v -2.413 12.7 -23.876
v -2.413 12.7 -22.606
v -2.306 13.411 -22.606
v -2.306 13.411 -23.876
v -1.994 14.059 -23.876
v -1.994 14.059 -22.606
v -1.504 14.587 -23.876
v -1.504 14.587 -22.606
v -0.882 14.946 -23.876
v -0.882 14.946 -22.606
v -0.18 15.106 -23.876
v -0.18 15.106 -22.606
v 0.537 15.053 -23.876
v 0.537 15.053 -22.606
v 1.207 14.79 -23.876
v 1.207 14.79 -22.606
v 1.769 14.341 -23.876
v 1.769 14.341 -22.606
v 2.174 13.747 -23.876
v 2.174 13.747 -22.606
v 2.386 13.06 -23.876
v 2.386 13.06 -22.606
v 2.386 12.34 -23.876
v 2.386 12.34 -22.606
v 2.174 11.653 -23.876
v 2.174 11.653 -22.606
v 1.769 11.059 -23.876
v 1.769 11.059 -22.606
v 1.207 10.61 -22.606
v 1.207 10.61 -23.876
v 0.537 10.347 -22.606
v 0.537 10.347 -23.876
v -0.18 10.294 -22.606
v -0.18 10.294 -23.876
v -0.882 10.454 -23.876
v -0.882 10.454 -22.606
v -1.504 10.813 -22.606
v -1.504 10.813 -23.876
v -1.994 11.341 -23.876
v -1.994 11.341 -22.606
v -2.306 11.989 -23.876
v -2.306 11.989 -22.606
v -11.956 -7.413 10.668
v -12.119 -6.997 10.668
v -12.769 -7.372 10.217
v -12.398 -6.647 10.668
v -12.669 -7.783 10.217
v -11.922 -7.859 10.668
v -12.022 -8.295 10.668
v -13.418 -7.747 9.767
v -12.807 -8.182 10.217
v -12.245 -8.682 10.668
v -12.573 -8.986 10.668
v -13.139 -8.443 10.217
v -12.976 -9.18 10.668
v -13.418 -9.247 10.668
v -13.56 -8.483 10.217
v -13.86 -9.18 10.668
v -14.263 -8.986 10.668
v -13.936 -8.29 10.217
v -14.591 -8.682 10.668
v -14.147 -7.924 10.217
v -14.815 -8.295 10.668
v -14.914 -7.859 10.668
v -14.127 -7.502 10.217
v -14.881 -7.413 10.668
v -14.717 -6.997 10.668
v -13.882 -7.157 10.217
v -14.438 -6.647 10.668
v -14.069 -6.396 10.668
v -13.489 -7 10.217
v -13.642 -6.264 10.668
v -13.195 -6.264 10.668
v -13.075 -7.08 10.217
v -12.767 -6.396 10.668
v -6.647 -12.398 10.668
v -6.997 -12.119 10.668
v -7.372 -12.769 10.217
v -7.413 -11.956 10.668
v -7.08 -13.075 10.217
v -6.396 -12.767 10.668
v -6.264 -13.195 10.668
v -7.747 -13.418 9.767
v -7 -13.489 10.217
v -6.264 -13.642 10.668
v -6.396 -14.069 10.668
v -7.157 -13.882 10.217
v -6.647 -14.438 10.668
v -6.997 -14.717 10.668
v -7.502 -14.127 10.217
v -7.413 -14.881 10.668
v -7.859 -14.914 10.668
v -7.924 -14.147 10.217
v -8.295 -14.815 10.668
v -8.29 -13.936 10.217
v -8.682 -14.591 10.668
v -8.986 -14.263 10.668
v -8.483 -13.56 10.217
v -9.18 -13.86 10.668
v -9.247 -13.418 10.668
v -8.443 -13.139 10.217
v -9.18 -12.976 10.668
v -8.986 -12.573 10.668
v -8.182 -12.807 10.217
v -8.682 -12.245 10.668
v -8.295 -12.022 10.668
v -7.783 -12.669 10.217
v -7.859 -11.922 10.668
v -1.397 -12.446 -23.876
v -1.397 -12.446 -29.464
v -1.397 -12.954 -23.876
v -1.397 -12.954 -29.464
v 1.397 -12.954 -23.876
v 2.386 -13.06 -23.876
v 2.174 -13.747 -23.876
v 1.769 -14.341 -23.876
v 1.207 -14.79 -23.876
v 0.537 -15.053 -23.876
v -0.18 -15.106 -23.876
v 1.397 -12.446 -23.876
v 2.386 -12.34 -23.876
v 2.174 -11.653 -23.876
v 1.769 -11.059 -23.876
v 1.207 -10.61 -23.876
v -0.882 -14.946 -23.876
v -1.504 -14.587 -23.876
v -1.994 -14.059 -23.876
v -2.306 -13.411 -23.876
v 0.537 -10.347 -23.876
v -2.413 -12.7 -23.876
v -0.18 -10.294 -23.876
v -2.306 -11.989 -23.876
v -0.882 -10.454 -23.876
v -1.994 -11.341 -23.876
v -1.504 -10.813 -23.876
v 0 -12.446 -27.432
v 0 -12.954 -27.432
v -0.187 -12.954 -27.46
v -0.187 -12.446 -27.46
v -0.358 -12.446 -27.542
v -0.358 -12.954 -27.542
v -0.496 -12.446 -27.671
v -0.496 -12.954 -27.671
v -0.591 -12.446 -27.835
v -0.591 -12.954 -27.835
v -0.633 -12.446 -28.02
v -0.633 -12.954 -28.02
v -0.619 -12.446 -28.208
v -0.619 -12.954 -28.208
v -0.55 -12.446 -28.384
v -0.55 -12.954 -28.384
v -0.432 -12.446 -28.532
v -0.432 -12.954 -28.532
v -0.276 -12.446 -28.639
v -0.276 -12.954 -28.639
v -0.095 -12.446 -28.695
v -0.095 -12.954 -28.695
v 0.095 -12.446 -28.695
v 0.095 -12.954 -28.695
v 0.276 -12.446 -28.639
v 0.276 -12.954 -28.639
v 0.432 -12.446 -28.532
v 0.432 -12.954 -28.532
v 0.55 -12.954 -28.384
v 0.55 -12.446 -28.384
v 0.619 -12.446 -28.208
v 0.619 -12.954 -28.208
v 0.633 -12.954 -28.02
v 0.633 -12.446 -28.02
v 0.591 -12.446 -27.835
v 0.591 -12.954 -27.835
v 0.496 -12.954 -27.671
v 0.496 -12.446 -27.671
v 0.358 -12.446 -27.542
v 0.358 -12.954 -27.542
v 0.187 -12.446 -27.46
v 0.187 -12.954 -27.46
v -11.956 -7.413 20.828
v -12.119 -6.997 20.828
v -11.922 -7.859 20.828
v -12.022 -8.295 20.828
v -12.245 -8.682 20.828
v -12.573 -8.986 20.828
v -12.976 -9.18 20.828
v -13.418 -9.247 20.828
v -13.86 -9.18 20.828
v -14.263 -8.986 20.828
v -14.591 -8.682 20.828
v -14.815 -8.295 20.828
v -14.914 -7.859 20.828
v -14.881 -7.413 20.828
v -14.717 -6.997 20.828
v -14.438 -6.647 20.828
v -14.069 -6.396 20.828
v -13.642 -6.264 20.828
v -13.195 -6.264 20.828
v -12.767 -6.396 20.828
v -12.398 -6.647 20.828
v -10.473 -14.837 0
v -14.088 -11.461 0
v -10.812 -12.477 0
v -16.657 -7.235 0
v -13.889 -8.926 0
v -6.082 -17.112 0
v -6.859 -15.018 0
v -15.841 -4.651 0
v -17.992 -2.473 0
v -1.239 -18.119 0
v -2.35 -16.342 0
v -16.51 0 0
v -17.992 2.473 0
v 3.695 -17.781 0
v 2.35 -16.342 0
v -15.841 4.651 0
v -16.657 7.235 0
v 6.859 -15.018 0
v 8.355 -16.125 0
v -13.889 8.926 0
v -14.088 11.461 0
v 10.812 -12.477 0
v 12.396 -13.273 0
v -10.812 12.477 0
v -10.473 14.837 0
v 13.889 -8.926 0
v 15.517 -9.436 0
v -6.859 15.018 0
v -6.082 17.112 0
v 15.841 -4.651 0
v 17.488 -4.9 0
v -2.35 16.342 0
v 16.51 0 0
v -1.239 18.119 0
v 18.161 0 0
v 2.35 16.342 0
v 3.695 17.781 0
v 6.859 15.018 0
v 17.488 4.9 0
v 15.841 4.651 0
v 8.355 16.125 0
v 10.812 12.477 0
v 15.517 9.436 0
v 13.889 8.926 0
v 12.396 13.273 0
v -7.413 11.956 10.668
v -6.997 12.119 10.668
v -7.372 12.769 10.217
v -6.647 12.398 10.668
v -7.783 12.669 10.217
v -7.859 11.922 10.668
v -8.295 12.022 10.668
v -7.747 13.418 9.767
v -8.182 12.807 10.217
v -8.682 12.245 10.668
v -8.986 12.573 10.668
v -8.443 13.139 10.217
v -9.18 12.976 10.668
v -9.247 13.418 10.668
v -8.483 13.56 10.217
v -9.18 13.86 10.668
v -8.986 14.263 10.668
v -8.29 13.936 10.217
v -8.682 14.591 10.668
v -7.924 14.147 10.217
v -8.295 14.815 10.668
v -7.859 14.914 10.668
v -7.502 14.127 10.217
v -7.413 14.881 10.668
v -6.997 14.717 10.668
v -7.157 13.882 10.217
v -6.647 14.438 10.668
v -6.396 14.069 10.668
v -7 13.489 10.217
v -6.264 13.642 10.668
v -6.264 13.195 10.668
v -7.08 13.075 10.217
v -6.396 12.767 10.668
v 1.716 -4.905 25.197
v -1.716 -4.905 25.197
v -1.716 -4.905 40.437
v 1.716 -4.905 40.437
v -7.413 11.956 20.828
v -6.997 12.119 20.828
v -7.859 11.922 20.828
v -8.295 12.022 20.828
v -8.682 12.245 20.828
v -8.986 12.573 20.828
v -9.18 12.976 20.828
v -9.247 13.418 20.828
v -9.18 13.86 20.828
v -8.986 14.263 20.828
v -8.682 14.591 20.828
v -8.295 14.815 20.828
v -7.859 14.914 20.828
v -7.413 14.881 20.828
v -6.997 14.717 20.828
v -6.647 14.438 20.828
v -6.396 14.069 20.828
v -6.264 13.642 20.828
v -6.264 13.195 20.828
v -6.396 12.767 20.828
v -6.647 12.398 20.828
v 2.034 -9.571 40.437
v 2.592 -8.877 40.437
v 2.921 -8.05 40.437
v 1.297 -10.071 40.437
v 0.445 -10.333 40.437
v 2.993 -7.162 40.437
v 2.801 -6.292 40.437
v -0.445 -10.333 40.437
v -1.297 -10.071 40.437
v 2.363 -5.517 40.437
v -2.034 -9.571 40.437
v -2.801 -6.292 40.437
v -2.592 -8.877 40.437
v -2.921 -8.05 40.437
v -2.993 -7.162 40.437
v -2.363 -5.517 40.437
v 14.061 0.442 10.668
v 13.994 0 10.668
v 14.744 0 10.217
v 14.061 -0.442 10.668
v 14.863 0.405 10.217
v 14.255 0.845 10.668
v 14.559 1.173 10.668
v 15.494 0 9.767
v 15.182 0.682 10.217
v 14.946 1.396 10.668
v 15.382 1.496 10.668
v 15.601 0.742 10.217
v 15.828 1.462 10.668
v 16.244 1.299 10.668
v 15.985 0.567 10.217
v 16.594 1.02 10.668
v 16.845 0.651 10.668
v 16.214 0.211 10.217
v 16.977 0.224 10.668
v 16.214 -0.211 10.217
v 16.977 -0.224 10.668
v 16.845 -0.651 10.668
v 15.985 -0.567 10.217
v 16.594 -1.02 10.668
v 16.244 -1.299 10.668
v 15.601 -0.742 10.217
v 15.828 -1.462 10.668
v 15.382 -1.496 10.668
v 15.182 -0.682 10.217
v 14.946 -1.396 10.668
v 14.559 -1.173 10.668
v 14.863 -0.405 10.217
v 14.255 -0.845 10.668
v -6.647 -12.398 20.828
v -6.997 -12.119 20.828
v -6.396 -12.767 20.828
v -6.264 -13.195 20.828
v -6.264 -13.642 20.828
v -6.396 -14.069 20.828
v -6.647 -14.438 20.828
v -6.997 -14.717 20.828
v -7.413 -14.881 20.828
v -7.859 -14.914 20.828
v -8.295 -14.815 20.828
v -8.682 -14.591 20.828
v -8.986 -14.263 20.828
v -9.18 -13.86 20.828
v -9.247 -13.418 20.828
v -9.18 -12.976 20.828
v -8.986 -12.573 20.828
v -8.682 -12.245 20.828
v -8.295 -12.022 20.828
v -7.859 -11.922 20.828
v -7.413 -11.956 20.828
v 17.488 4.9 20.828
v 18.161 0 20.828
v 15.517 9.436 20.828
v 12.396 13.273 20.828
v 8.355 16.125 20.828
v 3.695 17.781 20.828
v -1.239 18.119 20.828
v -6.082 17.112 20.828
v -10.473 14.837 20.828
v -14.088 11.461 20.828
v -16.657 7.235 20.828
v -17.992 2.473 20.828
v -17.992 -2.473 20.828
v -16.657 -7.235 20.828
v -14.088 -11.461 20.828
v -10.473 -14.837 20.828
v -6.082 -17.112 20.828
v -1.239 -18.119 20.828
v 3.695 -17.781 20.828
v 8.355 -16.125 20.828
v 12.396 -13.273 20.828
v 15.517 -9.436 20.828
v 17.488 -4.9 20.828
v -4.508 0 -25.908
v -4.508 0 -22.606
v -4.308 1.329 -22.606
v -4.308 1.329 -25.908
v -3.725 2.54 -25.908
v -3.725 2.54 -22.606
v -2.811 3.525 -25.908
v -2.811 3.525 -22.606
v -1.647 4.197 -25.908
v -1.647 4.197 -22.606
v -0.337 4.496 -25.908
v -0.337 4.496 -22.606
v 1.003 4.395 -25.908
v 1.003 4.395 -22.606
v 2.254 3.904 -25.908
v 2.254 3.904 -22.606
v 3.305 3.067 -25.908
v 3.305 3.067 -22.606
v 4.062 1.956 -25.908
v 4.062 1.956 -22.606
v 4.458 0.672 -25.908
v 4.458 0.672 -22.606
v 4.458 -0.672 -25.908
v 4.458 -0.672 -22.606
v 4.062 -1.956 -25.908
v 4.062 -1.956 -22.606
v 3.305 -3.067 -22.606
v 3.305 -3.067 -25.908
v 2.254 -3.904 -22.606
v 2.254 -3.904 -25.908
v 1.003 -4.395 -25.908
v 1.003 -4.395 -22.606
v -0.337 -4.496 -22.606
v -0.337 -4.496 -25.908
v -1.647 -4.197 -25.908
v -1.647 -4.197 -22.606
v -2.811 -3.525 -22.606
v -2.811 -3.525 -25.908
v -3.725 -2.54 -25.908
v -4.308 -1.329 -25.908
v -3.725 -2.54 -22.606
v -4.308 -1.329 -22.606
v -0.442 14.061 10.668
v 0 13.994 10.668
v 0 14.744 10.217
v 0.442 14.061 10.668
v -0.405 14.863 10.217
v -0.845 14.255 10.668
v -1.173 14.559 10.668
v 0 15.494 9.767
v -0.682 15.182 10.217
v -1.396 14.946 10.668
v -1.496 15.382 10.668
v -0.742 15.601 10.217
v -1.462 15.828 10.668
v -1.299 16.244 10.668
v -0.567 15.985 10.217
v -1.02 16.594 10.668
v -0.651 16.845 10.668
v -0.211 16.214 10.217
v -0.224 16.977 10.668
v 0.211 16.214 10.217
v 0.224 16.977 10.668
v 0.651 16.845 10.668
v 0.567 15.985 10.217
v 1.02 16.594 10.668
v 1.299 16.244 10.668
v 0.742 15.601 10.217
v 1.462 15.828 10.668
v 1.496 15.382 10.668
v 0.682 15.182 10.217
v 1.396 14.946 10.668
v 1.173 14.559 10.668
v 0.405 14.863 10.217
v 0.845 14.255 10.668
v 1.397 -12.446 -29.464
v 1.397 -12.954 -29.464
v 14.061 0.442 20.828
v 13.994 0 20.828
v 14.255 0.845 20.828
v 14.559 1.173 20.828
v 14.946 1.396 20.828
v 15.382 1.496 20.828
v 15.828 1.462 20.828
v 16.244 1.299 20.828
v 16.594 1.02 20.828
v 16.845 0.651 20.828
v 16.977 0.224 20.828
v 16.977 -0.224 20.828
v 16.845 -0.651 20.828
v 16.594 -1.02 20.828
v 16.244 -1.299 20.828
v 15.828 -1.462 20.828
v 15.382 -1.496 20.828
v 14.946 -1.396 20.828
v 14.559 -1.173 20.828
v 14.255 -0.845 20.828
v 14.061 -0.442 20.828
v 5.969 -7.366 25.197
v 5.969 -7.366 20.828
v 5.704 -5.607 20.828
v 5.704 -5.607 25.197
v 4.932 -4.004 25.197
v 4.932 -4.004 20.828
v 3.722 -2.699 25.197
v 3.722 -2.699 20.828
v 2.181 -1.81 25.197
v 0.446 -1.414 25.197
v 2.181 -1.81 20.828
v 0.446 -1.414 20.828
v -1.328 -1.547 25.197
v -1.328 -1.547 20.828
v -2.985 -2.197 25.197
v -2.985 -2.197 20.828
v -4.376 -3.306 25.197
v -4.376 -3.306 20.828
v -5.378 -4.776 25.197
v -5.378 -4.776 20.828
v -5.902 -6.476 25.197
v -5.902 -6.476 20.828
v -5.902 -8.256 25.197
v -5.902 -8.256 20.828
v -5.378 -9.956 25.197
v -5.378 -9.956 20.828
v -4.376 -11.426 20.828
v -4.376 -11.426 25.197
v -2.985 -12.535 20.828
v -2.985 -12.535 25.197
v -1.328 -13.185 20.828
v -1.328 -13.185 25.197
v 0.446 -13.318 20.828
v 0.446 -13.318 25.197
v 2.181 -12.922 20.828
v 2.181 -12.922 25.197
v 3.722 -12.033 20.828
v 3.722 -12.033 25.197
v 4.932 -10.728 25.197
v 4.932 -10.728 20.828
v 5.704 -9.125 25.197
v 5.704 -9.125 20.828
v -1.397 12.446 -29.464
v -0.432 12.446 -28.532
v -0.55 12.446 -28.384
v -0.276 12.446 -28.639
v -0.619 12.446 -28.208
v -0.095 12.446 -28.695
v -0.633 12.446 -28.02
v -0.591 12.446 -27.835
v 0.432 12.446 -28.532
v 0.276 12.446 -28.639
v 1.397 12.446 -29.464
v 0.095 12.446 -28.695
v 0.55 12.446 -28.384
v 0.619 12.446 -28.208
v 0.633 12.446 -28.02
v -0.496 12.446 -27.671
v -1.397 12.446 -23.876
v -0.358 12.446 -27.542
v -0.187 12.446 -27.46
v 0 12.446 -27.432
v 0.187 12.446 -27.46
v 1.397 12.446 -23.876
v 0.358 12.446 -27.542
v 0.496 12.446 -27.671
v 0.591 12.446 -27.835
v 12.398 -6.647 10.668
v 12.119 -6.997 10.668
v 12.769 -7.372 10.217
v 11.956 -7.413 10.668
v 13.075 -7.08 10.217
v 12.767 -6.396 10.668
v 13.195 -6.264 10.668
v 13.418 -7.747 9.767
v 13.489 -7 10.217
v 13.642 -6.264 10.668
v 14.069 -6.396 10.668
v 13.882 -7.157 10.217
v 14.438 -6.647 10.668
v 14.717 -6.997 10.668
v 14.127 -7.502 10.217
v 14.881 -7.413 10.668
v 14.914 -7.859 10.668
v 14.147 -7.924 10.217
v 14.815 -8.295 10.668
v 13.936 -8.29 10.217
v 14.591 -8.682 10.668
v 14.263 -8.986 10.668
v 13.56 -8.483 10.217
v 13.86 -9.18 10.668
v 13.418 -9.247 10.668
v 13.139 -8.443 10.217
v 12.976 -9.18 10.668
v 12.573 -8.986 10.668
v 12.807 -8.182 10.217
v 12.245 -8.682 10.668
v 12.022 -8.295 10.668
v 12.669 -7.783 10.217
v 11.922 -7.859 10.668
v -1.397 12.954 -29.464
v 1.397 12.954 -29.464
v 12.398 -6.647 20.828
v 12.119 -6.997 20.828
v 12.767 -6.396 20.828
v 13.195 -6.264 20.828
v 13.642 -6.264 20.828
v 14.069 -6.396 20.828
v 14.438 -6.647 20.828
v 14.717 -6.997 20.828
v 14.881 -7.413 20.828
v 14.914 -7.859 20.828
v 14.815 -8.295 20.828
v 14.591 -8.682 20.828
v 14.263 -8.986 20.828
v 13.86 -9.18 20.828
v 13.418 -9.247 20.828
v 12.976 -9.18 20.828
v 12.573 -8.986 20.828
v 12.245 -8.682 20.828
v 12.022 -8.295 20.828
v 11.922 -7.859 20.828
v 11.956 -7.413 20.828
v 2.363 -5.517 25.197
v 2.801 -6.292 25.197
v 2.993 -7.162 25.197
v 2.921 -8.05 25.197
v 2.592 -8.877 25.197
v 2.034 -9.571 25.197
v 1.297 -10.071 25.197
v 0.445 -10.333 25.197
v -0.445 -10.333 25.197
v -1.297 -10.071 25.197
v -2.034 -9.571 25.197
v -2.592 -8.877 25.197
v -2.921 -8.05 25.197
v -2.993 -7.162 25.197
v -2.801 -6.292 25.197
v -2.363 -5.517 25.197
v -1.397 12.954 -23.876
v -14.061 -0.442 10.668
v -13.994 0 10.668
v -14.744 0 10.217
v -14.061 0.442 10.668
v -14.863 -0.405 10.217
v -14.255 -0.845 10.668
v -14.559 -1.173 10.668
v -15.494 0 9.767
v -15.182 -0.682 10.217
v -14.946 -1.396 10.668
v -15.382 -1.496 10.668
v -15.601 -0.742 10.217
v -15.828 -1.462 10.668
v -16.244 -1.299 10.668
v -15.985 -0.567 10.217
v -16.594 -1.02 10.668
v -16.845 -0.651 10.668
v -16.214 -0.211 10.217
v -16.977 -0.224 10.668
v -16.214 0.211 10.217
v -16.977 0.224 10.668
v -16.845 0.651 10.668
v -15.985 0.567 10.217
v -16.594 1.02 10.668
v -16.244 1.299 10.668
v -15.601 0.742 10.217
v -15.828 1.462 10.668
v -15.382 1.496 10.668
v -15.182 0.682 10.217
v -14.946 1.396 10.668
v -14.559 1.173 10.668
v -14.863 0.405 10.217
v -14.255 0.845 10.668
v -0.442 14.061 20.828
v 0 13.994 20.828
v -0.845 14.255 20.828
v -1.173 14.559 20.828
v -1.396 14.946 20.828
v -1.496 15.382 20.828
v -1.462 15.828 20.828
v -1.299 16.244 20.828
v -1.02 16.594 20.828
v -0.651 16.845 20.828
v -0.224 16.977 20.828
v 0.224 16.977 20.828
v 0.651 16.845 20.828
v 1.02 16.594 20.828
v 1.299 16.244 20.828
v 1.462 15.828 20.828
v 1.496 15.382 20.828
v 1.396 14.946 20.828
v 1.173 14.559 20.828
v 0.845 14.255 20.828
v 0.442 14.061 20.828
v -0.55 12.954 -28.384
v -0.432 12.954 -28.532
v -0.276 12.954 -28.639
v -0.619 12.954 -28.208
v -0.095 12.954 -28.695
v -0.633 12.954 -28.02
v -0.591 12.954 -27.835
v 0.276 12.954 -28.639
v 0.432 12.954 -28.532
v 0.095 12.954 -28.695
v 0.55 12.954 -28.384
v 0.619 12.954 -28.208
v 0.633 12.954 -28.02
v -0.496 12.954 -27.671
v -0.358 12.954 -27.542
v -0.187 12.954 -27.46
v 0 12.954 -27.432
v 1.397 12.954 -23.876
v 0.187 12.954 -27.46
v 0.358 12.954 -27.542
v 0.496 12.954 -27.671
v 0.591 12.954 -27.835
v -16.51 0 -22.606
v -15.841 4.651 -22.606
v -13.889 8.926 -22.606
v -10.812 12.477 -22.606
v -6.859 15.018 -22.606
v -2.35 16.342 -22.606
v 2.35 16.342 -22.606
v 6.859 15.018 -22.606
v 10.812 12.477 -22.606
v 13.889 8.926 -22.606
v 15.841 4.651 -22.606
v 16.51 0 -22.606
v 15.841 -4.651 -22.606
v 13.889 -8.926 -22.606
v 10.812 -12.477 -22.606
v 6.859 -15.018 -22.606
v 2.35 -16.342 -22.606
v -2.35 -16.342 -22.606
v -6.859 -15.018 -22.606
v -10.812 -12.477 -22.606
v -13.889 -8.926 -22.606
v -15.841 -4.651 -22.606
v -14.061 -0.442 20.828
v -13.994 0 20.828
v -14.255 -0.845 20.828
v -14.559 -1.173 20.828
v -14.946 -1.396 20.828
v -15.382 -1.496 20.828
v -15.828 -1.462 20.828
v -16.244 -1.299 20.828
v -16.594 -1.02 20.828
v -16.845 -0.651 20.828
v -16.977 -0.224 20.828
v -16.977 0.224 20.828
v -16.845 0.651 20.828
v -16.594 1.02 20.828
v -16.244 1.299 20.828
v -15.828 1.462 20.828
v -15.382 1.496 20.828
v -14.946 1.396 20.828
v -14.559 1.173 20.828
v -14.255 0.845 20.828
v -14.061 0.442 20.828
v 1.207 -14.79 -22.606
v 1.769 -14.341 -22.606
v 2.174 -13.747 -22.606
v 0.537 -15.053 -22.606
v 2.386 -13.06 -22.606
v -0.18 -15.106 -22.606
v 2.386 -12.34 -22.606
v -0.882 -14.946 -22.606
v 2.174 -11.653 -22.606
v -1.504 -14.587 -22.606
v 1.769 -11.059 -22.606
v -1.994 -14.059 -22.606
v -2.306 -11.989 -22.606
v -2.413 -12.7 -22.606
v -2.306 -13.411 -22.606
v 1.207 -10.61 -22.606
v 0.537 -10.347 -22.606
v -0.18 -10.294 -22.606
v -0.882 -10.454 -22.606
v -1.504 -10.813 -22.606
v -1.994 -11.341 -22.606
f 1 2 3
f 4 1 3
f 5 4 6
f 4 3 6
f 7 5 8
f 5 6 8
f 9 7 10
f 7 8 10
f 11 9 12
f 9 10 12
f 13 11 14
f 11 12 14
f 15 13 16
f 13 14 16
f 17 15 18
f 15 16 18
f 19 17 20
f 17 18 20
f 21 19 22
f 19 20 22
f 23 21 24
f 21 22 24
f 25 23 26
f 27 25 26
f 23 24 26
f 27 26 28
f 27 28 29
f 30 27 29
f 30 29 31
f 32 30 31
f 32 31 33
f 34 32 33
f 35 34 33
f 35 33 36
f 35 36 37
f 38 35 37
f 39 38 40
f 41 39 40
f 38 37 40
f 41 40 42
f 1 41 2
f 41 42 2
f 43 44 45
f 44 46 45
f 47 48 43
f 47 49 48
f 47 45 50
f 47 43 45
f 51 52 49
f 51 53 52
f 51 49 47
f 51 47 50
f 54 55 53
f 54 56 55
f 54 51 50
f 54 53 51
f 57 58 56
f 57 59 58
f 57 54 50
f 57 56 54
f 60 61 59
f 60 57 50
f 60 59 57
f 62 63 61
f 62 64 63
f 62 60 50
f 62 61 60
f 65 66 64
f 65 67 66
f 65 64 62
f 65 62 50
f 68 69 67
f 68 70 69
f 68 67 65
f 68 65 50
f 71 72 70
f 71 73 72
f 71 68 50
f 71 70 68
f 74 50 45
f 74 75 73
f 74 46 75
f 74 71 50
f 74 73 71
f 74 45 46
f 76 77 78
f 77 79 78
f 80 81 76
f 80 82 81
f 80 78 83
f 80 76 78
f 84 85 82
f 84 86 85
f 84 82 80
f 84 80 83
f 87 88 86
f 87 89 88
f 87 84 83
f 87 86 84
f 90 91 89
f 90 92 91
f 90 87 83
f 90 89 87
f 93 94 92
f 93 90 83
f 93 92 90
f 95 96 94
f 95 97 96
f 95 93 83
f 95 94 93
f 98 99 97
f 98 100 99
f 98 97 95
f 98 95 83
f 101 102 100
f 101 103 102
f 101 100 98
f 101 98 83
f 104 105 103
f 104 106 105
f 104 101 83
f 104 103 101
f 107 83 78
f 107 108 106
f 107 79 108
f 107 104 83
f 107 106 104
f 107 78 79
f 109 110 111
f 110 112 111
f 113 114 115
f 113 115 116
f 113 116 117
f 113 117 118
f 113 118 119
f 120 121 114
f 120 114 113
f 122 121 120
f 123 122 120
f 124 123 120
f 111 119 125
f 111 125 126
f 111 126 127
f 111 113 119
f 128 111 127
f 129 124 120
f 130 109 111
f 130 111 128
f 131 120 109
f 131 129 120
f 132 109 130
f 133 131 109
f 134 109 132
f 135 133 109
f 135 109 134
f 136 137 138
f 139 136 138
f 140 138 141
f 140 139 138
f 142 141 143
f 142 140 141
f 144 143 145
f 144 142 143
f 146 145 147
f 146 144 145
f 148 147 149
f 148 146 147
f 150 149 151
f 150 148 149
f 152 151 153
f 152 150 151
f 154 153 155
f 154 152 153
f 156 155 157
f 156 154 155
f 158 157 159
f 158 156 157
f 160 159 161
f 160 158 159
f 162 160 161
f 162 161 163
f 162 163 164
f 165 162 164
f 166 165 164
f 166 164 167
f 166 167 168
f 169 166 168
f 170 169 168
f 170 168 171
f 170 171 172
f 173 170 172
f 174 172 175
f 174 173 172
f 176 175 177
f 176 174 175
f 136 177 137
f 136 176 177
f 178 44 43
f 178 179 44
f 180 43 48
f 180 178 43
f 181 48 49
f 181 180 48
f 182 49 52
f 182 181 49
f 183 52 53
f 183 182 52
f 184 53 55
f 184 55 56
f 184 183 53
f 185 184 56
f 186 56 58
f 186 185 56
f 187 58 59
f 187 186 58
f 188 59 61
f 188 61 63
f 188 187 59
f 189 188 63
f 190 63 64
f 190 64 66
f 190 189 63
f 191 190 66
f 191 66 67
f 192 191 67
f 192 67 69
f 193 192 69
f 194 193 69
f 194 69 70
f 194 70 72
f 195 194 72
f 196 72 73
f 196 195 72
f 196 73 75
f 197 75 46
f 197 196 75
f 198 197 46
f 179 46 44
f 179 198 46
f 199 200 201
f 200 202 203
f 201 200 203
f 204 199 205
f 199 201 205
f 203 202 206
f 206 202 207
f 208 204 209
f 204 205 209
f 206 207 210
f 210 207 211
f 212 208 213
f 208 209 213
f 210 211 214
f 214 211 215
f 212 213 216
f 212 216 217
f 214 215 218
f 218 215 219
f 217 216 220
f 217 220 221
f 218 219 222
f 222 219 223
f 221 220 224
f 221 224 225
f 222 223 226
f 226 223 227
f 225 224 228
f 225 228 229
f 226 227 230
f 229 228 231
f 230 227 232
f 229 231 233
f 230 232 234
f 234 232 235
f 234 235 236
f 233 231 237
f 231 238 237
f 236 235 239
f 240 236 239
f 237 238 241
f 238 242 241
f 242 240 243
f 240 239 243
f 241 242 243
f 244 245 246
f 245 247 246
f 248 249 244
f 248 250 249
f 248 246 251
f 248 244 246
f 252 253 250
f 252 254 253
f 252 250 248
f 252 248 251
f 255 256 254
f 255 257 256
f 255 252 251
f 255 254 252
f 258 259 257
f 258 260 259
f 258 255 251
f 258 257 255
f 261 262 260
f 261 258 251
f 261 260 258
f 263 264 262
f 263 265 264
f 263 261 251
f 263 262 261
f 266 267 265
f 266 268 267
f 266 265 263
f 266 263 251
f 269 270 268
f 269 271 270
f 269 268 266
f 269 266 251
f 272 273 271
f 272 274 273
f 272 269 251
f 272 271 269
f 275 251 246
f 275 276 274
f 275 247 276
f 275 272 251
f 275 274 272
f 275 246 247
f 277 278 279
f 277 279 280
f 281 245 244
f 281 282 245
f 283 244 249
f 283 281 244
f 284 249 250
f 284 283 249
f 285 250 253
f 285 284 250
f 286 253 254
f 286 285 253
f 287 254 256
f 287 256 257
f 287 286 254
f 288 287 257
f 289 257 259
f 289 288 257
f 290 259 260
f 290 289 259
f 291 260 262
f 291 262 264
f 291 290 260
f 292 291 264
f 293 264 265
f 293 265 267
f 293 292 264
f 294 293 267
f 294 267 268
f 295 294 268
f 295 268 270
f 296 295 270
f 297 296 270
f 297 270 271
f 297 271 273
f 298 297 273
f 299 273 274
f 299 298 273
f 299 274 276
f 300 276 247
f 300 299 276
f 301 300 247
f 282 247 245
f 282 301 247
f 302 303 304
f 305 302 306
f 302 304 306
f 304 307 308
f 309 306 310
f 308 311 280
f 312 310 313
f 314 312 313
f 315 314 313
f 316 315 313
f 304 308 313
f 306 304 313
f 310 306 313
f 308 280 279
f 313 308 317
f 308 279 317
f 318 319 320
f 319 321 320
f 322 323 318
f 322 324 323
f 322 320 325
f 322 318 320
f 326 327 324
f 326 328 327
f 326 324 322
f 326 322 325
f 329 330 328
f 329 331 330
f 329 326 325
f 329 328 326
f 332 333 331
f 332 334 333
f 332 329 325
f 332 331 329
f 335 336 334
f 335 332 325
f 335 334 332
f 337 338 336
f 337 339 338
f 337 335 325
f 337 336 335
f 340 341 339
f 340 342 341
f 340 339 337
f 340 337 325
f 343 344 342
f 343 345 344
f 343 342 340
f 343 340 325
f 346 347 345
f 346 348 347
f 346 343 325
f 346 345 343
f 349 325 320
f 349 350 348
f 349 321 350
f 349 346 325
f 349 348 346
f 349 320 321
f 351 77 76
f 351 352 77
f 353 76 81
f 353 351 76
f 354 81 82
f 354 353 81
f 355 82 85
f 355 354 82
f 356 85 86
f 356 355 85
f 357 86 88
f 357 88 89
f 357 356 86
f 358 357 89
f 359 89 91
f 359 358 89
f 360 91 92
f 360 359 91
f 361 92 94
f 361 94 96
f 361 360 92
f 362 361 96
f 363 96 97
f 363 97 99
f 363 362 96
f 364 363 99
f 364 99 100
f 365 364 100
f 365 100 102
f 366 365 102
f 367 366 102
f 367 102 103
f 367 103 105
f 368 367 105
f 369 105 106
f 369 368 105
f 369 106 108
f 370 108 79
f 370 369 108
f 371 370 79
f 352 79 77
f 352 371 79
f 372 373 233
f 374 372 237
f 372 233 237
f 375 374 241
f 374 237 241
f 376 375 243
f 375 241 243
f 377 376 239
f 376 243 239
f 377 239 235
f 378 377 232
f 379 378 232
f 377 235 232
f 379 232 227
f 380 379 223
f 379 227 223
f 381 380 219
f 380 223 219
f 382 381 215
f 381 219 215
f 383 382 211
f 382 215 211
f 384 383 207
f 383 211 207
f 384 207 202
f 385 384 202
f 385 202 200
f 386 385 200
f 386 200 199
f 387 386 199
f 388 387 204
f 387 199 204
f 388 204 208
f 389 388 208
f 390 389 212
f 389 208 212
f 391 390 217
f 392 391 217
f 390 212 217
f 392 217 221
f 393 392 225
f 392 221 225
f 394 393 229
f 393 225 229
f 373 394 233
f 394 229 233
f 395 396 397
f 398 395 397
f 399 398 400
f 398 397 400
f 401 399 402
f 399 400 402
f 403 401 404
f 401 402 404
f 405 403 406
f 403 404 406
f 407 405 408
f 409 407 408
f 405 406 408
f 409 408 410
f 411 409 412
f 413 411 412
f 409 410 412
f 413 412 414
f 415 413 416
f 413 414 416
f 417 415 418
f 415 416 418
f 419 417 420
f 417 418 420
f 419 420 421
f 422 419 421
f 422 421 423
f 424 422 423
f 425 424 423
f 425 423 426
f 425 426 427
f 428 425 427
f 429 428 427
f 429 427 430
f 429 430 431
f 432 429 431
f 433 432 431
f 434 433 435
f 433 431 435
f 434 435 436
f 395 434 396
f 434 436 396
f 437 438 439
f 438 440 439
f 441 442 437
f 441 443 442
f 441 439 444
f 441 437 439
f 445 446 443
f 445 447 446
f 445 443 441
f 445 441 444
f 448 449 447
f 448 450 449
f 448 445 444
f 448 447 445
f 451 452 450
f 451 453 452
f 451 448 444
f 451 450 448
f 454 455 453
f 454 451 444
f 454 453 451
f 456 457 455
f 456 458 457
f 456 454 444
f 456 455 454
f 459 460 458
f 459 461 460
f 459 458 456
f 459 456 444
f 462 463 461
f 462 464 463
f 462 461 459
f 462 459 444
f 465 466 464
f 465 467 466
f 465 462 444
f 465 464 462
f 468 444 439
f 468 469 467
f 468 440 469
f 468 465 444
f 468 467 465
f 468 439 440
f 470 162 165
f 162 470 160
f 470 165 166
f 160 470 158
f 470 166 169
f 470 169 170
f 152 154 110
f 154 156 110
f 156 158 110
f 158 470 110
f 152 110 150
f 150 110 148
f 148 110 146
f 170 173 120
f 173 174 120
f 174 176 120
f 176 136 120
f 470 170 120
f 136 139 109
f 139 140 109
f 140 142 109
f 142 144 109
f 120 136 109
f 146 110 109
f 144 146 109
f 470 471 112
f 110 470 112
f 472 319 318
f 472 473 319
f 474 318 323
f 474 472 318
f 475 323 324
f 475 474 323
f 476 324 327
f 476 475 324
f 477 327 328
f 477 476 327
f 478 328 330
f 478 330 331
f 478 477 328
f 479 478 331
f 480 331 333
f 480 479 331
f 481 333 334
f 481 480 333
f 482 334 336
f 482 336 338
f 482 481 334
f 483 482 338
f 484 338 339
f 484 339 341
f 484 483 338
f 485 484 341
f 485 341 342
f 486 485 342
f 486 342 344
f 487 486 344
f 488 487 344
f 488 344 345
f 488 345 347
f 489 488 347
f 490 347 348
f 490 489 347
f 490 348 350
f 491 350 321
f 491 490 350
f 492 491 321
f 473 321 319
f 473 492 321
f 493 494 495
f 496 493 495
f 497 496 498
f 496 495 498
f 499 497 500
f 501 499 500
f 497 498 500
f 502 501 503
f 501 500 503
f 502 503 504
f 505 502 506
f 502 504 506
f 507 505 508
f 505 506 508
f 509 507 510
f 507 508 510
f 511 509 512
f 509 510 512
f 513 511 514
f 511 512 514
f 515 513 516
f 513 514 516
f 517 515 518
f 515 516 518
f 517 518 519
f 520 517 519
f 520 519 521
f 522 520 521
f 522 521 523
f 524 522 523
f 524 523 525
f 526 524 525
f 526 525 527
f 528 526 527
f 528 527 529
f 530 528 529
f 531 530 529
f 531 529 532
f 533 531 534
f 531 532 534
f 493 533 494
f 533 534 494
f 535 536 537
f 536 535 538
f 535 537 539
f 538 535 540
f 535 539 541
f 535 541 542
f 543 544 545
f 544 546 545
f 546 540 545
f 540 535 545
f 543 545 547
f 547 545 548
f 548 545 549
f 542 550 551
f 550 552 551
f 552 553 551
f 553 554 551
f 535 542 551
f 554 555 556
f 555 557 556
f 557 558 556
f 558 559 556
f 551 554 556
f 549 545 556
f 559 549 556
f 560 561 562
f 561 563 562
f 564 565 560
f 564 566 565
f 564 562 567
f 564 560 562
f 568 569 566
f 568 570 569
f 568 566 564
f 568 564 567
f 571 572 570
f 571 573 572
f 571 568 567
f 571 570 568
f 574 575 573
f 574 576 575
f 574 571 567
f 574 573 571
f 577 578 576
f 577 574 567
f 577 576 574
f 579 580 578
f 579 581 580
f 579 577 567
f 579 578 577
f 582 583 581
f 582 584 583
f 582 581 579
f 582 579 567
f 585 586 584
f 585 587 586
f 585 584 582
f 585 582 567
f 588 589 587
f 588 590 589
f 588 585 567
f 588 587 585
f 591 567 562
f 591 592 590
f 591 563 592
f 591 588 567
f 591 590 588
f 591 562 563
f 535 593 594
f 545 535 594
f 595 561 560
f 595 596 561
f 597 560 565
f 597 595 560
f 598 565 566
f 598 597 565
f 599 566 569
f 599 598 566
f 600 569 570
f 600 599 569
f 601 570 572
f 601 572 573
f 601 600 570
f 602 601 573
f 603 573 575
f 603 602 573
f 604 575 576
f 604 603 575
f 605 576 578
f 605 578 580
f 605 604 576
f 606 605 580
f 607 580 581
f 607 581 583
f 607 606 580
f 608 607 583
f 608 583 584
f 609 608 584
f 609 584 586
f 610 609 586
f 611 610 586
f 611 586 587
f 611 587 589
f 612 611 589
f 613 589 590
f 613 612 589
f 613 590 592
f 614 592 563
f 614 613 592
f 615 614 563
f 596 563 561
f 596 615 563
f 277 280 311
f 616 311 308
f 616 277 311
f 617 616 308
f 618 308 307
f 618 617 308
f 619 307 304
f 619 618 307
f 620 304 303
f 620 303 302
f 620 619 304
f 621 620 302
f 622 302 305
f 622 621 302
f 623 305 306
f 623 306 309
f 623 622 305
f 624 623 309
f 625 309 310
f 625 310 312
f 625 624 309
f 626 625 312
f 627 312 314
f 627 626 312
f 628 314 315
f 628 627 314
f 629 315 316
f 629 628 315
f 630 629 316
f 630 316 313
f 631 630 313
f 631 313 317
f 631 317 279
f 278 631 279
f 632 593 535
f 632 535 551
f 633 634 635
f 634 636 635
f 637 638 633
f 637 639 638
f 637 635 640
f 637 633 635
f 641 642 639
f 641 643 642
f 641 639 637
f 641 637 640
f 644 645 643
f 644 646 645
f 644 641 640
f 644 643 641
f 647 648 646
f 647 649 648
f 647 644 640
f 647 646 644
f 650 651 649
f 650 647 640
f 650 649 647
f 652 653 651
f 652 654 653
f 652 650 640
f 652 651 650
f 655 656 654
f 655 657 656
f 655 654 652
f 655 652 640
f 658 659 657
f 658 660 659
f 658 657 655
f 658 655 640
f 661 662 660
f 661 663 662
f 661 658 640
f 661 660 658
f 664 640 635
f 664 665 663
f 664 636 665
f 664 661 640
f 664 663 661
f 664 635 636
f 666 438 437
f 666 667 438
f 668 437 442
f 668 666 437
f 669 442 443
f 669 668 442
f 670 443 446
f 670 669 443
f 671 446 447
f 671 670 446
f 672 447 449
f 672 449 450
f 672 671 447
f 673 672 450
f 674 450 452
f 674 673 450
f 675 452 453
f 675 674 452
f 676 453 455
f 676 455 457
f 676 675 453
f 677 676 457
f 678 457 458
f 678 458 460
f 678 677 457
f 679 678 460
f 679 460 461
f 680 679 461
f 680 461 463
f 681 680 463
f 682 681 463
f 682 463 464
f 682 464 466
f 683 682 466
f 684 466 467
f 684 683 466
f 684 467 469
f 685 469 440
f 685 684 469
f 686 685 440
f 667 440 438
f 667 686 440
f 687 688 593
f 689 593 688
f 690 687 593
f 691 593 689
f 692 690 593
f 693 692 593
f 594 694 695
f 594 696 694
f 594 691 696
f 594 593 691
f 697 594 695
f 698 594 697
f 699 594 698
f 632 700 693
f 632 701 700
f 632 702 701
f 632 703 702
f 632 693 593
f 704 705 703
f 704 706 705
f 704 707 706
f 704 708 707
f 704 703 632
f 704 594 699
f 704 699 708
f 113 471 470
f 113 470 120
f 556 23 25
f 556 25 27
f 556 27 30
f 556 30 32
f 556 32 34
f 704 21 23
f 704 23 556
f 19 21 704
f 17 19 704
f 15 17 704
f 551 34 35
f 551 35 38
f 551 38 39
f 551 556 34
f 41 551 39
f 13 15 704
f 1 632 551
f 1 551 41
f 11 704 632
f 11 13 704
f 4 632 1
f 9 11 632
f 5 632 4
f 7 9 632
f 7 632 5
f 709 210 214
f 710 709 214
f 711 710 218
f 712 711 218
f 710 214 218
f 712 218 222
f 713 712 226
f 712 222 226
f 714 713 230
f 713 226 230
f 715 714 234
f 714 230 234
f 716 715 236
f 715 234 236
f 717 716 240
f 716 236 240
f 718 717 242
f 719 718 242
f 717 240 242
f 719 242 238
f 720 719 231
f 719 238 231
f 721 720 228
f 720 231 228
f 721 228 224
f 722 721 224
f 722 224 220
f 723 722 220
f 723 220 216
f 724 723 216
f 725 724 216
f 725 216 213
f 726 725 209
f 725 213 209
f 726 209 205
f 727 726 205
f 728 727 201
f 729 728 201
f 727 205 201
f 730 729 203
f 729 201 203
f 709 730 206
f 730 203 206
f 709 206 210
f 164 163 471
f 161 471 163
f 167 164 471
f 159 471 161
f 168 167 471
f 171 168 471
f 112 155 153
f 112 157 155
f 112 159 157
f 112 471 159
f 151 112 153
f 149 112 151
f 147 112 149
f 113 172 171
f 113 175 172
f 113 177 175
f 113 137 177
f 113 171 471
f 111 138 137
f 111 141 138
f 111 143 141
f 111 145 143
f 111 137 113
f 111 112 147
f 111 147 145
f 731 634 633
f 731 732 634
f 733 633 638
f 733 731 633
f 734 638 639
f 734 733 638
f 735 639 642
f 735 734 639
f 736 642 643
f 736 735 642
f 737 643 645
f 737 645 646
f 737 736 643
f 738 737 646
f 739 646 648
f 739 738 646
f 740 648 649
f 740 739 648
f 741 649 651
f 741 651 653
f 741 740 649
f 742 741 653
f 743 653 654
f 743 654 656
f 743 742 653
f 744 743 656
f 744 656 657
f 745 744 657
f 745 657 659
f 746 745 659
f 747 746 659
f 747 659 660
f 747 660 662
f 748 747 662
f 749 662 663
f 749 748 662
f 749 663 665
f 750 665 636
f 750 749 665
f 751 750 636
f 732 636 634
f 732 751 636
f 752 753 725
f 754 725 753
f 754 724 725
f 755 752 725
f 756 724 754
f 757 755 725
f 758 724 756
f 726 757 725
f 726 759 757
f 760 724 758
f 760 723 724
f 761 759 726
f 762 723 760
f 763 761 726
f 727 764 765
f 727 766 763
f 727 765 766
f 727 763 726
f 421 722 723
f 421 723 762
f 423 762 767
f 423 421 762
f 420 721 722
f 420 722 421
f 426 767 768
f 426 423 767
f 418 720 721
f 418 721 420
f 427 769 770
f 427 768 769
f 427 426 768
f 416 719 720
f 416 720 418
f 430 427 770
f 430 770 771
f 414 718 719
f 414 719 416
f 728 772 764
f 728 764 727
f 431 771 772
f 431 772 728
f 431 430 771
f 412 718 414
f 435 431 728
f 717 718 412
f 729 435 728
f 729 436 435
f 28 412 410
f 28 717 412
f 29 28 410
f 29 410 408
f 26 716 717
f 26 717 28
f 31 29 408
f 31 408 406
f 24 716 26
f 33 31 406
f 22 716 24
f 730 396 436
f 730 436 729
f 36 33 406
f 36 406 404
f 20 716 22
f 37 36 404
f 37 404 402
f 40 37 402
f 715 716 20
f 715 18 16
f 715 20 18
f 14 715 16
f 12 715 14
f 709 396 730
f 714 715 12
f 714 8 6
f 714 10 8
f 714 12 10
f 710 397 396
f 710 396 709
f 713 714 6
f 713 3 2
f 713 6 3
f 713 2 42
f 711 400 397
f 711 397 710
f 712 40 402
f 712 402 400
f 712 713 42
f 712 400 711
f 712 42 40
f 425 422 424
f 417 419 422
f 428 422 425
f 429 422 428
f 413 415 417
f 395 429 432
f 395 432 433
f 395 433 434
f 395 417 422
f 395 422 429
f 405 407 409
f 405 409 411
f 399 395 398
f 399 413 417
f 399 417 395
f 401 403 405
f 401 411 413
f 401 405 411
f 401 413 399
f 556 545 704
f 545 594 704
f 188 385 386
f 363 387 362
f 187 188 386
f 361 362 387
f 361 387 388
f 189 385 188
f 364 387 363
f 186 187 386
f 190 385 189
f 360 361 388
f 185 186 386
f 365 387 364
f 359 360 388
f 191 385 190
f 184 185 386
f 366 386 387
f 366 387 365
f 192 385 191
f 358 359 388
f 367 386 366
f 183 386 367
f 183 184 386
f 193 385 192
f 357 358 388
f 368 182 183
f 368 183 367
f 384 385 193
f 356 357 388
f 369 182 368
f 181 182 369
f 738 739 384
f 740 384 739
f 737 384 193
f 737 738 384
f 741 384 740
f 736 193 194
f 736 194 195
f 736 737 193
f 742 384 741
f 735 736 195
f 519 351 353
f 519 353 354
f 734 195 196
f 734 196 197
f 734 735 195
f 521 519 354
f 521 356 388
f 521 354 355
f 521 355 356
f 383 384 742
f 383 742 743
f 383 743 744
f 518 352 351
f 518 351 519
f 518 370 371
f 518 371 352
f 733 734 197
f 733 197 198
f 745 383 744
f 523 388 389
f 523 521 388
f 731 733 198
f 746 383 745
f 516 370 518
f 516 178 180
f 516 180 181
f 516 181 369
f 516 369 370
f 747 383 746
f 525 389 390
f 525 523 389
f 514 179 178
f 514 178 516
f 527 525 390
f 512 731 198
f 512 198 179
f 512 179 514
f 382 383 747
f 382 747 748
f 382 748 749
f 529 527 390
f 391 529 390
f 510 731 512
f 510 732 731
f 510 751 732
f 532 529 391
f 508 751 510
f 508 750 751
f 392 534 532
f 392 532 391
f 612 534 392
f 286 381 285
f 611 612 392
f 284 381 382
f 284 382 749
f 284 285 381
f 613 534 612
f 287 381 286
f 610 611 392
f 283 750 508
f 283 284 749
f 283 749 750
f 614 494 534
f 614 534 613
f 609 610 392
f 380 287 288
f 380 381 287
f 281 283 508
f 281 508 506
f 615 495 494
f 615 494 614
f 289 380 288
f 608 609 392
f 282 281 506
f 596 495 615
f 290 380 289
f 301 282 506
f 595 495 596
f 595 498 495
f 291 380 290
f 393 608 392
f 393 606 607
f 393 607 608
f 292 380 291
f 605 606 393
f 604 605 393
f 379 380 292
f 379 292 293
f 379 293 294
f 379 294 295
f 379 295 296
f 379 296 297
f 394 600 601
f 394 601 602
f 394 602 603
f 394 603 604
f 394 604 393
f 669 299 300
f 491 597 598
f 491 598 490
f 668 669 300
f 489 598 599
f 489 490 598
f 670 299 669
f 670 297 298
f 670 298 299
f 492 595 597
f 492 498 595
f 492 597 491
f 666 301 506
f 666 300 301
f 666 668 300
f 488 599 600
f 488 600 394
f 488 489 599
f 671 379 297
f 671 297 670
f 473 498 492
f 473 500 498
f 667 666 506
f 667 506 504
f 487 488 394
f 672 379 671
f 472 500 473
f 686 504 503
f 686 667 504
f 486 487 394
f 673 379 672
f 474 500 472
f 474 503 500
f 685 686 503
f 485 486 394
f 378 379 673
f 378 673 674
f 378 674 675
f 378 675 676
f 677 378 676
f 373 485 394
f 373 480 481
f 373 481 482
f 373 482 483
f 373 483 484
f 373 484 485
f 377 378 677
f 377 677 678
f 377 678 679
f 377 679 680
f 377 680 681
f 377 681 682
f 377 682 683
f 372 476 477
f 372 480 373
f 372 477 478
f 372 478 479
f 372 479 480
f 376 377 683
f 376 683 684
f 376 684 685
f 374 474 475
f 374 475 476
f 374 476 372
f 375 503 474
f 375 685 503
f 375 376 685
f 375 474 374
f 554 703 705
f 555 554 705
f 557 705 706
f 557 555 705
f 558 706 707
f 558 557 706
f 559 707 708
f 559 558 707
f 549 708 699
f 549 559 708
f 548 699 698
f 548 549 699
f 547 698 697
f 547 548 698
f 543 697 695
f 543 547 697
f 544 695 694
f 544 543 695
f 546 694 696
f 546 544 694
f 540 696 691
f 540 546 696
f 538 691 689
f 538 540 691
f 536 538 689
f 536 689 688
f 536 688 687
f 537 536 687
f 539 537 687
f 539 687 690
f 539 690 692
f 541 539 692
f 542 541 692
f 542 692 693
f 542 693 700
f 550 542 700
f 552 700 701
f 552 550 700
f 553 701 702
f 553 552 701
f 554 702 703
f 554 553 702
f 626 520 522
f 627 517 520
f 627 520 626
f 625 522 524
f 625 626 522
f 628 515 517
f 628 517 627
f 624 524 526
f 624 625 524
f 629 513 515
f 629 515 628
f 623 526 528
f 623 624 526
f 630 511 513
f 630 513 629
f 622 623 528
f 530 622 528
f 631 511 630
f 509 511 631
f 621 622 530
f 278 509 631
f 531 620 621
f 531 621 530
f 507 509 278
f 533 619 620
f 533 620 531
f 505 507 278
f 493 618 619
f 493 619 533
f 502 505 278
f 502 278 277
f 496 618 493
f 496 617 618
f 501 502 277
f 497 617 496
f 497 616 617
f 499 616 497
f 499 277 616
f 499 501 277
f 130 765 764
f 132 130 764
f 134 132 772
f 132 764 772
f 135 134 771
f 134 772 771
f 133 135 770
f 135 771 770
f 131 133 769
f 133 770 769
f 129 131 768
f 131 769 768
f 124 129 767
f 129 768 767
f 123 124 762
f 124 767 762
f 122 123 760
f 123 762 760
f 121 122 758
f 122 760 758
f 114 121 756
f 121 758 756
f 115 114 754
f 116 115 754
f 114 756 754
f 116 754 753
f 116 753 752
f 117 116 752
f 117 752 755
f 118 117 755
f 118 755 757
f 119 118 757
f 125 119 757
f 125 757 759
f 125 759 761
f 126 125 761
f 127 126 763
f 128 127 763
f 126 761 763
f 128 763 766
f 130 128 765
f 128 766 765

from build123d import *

# Parameters (mm, degrees)
SKETCH1_R           = 18.161
BOSS_EXTRUDE1_DEPTH = 20.828
SKETCH2_R           = 16.51
BOSS_EXTRUDE2_DEPTH = 22.606
SKETCH3_R           = 4.5085
BOSS_EXTRUDE3_DEPTH = 3.302
SKETCH4_R           = 2.413
BOSS_EXTRUDE4_DEPTH = 1.27
SKETCH5_R           = 5.969
BOSS_EXTRUDE5_DEPTH = 4.3688
BOSS_EXTRUDE6_DEPTH = 15.24
SKETCH8_W           = 5.588
SKETCH8_H           = 2.794
SKETCH8_R           = 0.635
BOSS_EXTRUDE7_DEPTH = 0.254
CIRPATTERN1_COUNT   = 2
CIRPATTERN2_COUNT   = 12


with BuildPart() as part:
    # Sketch1 → Boss-Extrude1 (new body)
    with BuildSketch(Plane.XY):
        Circle(SKETCH1_R)
    extrude(amount=BOSS_EXTRUDE1_DEPTH)

    # Sketch2 → Boss-Extrude2 (add)
    with BuildSketch(Plane(origin=(0, 0, 0), x_dir=(-1, 0, 0), z_dir=(0, 0, -1))):
        Circle(SKETCH2_R)
    extrude(amount=BOSS_EXTRUDE2_DEPTH)

    # Sketch3 → Boss-Extrude3 (add)
    with BuildSketch(Plane(origin=(0, 0, -22.606), x_dir=(-1, 0, 0), z_dir=(0, 0, -1))):
        Circle(SKETCH3_R)
    extrude(amount=BOSS_EXTRUDE3_DEPTH)

    # Sketch4 → Boss-Extrude4 (add)
    with BuildSketch(Plane(origin=(0, 0, -22.606), x_dir=(-1, 0, 0), z_dir=(0, 0, -1))):
        with Locations((0, -12.7)):
            Circle(SKETCH4_R)
        with Locations((0, 12.7)):
            Circle(SKETCH4_R)
    extrude(amount=BOSS_EXTRUDE4_DEPTH)

    # Sketch5 → Boss-Extrude5 (add)
    with BuildSketch(Plane.XY.offset(20.828)):
        with Locations((0, -7.366)):
            Circle(SKETCH5_R)
    extrude(amount=BOSS_EXTRUDE5_DEPTH)

    # Sketch6 → Boss-Extrude6 (add)
    with BuildSketch(Plane.XY.offset(25.1968)):
        with BuildLine():
            Line((-1.715657017, -4.905), (1.715657017, -4.905))
            ThreePointArc((1.715657017, -4.905), (0, -10.366), (-1.715657017, -4.905))
        make_face()
    extrude(amount=BOSS_EXTRUDE6_DEPTH)

    # Sketch8 → Boss-Extrude7 (add, symmetric)
    with BuildSketch(Plane.ZX.offset(12.7)):
        with Locations((-26.67, 0)):
            Rectangle(SKETCH8_W, SKETCH8_H)
        with Locations((-28.067, 0)):
            Circle(SKETCH8_R, mode=Mode.SUBTRACT)
    boss_extrude7 = extrude(amount=BOSS_EXTRUDE7_DEPTH, both=True)

    # CirPattern1: Boss-Extrude7 ×2 about axis
    cirpattern1_axis = Axis((0, 0, -25.908), (0, 0, 1))
    for i in range(1, CIRPATTERN1_COUNT):
        add(boss_extrude7.rotate(cirpattern1_axis, i * 360 / CIRPATTERN1_COUNT))

    # Sketch12 → Ø3.0mm Dowel Hole1 (revolve, cut)
    with BuildSketch(Plane(origin=(0, 15.494, 20.828), x_dir=(0, -1, 0), z_dir=(1, 0, 0))):
        Polygon((0, 0), (0, 11.061290929), (1.5, 10.16), (1.5, 0), align=None)
    f_3_0mm_dowel_hole1 = revolve(axis=Axis((0, 15.494, 27.178), (0, 0, -1)), mode=Mode.SUBTRACT)

    # CirPattern2: Ø3.0mm Dowel Hole1 ×12 about axis, 5 skipped
    cirpattern2_axis = Axis((0, 0, 20.828), (0, 0, -1))
    add([f_3_0mm_dowel_hole1.rotate(cirpattern2_axis, i * 360 / CIRPATTERN2_COUNT) for i in range(1, CIRPATTERN2_COUNT) if i not in (1, 2, 5, 6, 10)], mode=Mode.SUBTRACT)


solid = part.part
